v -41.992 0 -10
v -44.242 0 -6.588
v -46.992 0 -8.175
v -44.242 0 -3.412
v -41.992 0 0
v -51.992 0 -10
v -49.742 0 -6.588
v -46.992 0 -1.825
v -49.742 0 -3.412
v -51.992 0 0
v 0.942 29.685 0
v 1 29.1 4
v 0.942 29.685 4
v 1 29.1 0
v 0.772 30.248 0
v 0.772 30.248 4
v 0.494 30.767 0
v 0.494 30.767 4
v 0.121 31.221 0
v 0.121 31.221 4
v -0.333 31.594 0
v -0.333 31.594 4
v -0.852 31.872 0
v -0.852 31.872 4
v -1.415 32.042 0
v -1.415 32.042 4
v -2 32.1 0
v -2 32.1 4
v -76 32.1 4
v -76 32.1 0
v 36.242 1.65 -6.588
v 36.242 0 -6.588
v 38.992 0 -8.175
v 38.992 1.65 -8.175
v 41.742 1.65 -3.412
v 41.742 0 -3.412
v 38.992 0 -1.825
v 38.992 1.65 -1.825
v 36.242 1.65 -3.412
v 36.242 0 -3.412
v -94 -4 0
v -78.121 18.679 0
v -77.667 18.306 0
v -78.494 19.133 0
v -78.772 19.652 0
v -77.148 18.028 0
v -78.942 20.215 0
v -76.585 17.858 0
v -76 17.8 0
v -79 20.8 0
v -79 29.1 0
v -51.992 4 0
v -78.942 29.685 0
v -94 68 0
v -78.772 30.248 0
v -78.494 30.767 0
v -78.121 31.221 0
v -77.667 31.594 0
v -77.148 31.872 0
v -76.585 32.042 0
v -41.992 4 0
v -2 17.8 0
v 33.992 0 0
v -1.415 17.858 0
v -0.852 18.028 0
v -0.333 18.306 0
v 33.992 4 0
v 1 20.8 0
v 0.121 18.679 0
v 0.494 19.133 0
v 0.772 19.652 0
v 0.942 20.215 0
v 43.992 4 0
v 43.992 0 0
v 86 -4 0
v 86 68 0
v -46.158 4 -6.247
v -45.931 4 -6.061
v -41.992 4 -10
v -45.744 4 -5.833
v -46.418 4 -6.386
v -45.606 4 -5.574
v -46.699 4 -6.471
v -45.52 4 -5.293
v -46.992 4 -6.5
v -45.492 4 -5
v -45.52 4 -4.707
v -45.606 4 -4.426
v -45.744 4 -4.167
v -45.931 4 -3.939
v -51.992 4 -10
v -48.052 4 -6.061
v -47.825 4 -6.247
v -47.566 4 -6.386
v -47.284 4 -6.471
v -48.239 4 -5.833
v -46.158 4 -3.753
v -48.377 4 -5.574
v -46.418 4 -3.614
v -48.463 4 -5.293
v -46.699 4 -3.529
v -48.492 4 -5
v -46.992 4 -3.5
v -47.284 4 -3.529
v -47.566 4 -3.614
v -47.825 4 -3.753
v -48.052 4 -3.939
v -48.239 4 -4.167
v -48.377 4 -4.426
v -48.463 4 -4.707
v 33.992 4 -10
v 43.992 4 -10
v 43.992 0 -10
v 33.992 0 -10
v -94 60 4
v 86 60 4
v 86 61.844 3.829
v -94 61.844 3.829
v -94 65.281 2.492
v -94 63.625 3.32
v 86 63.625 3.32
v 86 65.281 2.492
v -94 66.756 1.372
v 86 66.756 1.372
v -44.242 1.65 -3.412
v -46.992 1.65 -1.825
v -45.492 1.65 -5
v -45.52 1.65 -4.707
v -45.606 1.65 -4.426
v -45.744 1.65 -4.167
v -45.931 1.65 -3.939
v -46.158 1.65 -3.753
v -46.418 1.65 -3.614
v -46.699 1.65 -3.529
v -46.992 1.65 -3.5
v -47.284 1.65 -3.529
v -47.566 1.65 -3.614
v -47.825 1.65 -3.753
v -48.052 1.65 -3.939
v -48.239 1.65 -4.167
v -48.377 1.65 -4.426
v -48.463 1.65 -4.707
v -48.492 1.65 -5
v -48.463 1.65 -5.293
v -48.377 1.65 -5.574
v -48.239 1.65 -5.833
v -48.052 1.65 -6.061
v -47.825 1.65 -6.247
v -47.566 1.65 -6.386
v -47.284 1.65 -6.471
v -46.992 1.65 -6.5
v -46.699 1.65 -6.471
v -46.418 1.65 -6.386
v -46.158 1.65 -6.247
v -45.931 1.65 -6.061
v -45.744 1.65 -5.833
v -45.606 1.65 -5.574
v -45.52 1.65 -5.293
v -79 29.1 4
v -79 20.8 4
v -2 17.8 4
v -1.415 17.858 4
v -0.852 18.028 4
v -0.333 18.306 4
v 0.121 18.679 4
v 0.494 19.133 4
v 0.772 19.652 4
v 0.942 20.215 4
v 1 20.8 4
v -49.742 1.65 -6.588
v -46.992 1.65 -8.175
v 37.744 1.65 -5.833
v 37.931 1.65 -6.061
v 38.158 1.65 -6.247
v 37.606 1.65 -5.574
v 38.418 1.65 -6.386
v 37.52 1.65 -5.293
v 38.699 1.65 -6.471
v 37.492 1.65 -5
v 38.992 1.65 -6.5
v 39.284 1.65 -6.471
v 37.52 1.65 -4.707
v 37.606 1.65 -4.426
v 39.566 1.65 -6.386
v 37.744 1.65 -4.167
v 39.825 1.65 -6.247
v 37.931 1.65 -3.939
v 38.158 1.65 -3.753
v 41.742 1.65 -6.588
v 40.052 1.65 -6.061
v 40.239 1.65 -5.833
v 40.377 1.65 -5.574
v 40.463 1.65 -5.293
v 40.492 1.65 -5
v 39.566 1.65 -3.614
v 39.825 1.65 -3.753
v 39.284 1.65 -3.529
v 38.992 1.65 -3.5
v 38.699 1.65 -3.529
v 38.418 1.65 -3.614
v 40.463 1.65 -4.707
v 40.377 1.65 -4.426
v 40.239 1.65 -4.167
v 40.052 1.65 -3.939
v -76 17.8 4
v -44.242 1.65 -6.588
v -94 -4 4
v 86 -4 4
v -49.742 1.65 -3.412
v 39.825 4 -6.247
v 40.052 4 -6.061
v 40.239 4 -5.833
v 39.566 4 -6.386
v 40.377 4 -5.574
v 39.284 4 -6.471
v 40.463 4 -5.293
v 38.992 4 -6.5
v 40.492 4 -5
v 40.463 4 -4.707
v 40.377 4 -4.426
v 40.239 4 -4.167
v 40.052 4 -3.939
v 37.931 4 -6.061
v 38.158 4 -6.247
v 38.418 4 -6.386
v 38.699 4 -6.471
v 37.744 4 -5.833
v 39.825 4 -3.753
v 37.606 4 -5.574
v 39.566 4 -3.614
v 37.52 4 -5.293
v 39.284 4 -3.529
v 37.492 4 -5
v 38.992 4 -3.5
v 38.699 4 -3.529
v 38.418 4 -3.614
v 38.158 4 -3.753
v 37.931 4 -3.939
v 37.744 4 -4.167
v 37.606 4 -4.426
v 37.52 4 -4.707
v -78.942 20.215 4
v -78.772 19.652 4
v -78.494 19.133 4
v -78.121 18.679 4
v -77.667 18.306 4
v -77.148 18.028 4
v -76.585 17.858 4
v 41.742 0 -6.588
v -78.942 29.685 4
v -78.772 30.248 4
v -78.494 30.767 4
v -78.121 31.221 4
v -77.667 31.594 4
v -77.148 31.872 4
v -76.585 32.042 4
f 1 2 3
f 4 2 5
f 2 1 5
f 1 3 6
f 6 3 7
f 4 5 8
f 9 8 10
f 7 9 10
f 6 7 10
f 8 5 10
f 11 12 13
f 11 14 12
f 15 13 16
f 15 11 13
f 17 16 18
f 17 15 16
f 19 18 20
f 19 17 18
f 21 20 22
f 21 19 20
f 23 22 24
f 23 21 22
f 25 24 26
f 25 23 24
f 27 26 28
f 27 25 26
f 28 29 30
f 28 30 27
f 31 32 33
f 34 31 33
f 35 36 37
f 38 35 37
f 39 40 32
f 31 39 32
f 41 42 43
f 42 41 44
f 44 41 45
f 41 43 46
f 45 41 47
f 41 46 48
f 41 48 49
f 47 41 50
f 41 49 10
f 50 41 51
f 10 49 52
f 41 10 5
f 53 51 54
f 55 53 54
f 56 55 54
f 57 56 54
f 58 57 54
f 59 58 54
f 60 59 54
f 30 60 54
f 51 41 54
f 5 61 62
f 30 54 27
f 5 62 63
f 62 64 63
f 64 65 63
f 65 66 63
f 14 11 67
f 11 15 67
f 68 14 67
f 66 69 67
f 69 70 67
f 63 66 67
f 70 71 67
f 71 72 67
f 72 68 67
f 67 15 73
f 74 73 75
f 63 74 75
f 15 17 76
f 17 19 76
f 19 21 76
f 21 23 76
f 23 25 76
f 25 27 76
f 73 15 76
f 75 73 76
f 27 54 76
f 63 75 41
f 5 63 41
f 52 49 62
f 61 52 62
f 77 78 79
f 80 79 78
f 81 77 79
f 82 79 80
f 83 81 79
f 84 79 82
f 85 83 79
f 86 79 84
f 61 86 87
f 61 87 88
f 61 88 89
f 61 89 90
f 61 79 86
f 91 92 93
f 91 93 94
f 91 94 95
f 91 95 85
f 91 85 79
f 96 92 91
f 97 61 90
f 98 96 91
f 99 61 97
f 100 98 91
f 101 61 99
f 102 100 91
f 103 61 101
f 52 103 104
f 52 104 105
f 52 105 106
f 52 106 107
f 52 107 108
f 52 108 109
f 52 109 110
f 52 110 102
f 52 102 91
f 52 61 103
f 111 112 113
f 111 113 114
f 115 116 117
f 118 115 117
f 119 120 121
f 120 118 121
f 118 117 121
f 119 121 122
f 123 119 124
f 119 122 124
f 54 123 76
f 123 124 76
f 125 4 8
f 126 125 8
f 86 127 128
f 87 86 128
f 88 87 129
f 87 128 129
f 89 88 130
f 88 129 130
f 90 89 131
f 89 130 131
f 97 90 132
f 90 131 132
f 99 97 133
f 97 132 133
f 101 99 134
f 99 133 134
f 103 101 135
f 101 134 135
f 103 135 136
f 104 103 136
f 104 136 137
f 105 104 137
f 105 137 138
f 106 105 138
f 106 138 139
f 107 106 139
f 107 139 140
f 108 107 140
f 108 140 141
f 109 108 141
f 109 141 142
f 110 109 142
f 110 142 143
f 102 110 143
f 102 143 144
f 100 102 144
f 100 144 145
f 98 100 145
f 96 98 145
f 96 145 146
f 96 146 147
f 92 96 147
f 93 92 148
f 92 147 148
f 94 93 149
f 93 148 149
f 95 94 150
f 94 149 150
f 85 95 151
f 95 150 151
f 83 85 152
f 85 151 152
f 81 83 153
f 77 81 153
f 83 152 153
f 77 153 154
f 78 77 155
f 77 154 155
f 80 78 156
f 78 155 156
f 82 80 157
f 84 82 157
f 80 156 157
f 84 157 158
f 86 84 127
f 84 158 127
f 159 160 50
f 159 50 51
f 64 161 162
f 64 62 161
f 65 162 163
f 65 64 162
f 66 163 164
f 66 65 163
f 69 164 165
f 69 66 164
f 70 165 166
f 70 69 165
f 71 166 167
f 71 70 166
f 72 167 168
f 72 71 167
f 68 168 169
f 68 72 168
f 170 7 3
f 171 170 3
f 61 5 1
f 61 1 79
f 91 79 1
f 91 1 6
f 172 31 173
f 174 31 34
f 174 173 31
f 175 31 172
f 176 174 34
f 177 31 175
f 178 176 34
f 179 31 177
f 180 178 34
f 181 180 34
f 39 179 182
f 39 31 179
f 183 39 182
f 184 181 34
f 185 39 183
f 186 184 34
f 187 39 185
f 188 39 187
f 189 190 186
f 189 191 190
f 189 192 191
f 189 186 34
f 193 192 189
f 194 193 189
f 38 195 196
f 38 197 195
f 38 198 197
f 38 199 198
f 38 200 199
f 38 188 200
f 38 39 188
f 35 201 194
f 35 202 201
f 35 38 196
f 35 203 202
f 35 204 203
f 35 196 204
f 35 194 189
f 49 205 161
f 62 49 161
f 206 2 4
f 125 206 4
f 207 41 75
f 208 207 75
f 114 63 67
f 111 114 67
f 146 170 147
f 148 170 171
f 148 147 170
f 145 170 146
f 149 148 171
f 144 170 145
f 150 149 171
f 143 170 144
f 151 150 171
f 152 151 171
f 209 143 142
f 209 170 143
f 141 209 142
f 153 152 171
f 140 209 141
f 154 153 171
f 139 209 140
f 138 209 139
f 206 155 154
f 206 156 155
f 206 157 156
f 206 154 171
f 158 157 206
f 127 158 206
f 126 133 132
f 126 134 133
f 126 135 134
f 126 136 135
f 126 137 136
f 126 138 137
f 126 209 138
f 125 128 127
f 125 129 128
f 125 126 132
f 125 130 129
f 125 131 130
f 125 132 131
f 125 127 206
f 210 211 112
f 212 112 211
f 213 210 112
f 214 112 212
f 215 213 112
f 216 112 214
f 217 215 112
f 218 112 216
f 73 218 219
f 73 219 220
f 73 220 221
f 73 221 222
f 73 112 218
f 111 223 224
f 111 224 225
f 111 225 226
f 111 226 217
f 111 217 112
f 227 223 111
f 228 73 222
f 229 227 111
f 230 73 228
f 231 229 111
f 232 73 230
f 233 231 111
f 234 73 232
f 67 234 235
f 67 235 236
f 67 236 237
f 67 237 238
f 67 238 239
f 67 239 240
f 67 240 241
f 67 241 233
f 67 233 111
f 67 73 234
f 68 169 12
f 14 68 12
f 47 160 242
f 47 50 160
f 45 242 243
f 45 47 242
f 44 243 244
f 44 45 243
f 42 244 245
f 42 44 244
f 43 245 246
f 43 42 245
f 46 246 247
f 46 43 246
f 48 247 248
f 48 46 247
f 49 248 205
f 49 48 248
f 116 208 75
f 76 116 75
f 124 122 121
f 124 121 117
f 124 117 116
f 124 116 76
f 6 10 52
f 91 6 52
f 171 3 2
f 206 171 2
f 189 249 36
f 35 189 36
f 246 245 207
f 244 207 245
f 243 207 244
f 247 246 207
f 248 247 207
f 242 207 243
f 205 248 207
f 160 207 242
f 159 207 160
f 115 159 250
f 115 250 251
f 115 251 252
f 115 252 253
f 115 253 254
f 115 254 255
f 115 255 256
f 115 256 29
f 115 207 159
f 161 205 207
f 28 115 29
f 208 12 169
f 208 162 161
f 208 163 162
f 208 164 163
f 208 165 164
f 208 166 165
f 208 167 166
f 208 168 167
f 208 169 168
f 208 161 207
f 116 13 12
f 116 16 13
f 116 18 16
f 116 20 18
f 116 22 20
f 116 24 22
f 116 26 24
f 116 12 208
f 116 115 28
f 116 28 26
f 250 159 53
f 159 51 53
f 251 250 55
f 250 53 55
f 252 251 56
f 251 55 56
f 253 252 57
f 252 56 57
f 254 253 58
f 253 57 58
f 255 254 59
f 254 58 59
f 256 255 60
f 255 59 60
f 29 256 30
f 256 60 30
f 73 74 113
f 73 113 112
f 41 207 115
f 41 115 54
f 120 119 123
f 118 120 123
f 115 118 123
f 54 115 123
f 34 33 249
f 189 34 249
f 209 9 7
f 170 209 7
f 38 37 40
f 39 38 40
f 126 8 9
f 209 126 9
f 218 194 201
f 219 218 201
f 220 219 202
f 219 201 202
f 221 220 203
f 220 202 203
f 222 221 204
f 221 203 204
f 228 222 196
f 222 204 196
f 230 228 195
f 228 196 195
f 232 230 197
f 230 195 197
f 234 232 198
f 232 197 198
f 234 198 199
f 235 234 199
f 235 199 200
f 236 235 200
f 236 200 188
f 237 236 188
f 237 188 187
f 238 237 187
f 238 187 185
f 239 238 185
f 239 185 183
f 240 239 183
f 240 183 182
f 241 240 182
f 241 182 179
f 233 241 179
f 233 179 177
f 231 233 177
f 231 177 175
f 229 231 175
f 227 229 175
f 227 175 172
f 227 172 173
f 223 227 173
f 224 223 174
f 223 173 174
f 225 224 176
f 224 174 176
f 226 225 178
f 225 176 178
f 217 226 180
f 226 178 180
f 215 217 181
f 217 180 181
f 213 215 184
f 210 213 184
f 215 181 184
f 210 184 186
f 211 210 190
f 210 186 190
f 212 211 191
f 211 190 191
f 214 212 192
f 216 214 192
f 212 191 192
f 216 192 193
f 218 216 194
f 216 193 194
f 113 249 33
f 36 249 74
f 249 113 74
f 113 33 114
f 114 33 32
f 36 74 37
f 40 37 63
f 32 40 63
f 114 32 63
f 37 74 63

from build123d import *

# Parameters (mm, degrees)
SALIENTE_EXTRUIR1_DEPTH = 4
CROQUIS2_W              = 10
CROQUIS2_H              = 4
SALIENTE_EXTRUIR2_DEPTH = 10
CROQUIS3_R              = 1.5
CORTAR_EXTRUIR1_DEPTH   = 10
CROQUIS3_3_R            = 1.5
CORTAR_EXTRUIR2_DEPTH   = 1.65
REDONDEO2_R             = 10
CROQUIS4_W              = 4
CROQUIS4_H              = 72
CORTAR_EXTRUIR3_DEPTH   = 4
CORTAR_EXTRUIR4_REACH   = 118.859
CROQUIS5_W              = 80
CROQUIS5_H              = 14.3
REDONDEO3_R             = 3


with BuildPart() as part:
    # Croquis1 → Saliente-Extruir1 (new body)
    with BuildSketch(Plane.XY):
        with BuildLine():
            Line((-98, 60), (-98, -4))
            Line((-98, -4), (90, -4))
            Line((90, -4), (90, 60))
            ThreePointArc((90, 60), (88.94427191, 64.472135955), (86, 68))
            Line((86, 68), (-94, 68))
            ThreePointArc((-94, 68), (-96.94427191, 64.472135955), (-98, 60))
        make_face()
    extrude(amount=SALIENTE_EXTRUIR1_DEPTH)

    # Croquis2 → Saliente-Extruir2 (add)
    with BuildSketch(Plane(origin=(0, 0, 0), x_dir=(-1, 0, 0), z_dir=(0, 0, -1))):
        with Locations((46.991549296, 2)):
            Rectangle(CROQUIS2_W, CROQUIS2_H)
        with Locations((-38.991549296, 2)):
            Rectangle(CROQUIS2_W, CROQUIS2_H)
    extrude(amount=SALIENTE_EXTRUIR2_DEPTH)

    # Croquis3 → Cortar-Extruir1 (cut)
    with BuildSketch(Plane.XZ):
        with Locations((38.991549296, -5)):
            Circle(CROQUIS3_R)
        with Locations((-46.991549296, -5)):
            Circle(CROQUIS3_R)
    extrude(amount=-CORTAR_EXTRUIR1_DEPTH, mode=Mode.SUBTRACT)

    # Croquis3<3> → Cortar-Extruir2 (cut)
    # profile 1 of 2: a face of its own
    with BuildSketch(Plane.XZ):
        Polygon((-46.991549296, -8.175426481), (-44.241549296, -6.58771324), (-44.241549296, -3.41228676), (-46.991549296, -1.824573519), (-49.741549296, -3.41228676), (-49.741549296, -6.58771324), align=None)
        with Locations((-46.991549296, -5)):
            Circle(CROQUIS3_3_R, mode=Mode.SUBTRACT)
    # profile 2 of 2: a face of its own
    with BuildSketch(Plane.XZ):
        Polygon((38.991549296, -8.175426481), (41.741549296, -6.58771324), (41.741549296, -3.41228676), (38.991549296, -1.824573519), (36.241549296, -3.41228676), (36.241549296, -6.58771324), align=None)
        with Locations((38.991549296, -5)):
            Circle(CROQUIS3_3_R, mode=Mode.SUBTRACT)
    extrude(amount=-CORTAR_EXTRUIR2_DEPTH, mode=Mode.SUBTRACT)

    # Redondeo2
    # the kernel refuses this fillet: 10 mm, written as the material it takes off along each edge
    with BuildSketch(Plane(origin=(106, 68, 4), x_dir=(0, -1, 0), z_dir=(-1, 0, 0))) as redondeo2_piece_1:
        with BuildLine():
            CenterArc((8, -10), REDONDEO2_R, 90, 53.130102354)
            Line((0, -4), (-0.16, -3.88))
            ThreePointArc((-0.16, -3.88), (-0.2, -2), (-0.2, 0))
            Line((-0.2, 0), (0, 0.2))
            Line((0, 0.2), (8, 0.2))
            Line((8, 0.2), (8, 0))
        make_face()
    extrude(amount=220, mode=Mode.SUBTRACT)

    # Croquis4 → Cortar-Extruir3 (cut)
    with BuildSketch(Plane.XY.offset(4)):
        with Locations((88, 32)):
            Rectangle(CROQUIS4_W, CROQUIS4_H)
        with Locations((-96, 32)):
            Rectangle(CROQUIS4_W, CROQUIS4_H)
    extrude(amount=-CORTAR_EXTRUIR3_DEPTH, mode=Mode.SUBTRACT)

    # Croquis5 → Cortar-Extruir4 (cut, up to next)
    with BuildSketch(Plane.XY.offset(4), mode=Mode.PRIVATE) as cortar_extruir4_sk1:
        with Locations((-39, 24.95)):
            Rectangle(CROQUIS5_W, CROQUIS5_H)
    cortar_extruir4_tool1 = extrude(cortar_extruir4_sk1.sketch, amount=-CORTAR_EXTRUIR4_REACH, mode=Mode.PRIVATE) & part.part
    add(cortar_extruir4_tool1.solids().sort_by_distance((-39, 24.95, 4))[0], mode=Mode.SUBTRACT)

    # Redondeo3
    redondeo3_edges = [part.edges().sort_by_distance(p)[0] for p in [
        (-79, 17.8, 2),
        (-79, 32.1, 2),
        (1, 32.1, 2),
        (1, 17.8, 2),
    ]]
    fillet(redondeo3_edges, radius=REDONDEO3_R)


solid = part.part
